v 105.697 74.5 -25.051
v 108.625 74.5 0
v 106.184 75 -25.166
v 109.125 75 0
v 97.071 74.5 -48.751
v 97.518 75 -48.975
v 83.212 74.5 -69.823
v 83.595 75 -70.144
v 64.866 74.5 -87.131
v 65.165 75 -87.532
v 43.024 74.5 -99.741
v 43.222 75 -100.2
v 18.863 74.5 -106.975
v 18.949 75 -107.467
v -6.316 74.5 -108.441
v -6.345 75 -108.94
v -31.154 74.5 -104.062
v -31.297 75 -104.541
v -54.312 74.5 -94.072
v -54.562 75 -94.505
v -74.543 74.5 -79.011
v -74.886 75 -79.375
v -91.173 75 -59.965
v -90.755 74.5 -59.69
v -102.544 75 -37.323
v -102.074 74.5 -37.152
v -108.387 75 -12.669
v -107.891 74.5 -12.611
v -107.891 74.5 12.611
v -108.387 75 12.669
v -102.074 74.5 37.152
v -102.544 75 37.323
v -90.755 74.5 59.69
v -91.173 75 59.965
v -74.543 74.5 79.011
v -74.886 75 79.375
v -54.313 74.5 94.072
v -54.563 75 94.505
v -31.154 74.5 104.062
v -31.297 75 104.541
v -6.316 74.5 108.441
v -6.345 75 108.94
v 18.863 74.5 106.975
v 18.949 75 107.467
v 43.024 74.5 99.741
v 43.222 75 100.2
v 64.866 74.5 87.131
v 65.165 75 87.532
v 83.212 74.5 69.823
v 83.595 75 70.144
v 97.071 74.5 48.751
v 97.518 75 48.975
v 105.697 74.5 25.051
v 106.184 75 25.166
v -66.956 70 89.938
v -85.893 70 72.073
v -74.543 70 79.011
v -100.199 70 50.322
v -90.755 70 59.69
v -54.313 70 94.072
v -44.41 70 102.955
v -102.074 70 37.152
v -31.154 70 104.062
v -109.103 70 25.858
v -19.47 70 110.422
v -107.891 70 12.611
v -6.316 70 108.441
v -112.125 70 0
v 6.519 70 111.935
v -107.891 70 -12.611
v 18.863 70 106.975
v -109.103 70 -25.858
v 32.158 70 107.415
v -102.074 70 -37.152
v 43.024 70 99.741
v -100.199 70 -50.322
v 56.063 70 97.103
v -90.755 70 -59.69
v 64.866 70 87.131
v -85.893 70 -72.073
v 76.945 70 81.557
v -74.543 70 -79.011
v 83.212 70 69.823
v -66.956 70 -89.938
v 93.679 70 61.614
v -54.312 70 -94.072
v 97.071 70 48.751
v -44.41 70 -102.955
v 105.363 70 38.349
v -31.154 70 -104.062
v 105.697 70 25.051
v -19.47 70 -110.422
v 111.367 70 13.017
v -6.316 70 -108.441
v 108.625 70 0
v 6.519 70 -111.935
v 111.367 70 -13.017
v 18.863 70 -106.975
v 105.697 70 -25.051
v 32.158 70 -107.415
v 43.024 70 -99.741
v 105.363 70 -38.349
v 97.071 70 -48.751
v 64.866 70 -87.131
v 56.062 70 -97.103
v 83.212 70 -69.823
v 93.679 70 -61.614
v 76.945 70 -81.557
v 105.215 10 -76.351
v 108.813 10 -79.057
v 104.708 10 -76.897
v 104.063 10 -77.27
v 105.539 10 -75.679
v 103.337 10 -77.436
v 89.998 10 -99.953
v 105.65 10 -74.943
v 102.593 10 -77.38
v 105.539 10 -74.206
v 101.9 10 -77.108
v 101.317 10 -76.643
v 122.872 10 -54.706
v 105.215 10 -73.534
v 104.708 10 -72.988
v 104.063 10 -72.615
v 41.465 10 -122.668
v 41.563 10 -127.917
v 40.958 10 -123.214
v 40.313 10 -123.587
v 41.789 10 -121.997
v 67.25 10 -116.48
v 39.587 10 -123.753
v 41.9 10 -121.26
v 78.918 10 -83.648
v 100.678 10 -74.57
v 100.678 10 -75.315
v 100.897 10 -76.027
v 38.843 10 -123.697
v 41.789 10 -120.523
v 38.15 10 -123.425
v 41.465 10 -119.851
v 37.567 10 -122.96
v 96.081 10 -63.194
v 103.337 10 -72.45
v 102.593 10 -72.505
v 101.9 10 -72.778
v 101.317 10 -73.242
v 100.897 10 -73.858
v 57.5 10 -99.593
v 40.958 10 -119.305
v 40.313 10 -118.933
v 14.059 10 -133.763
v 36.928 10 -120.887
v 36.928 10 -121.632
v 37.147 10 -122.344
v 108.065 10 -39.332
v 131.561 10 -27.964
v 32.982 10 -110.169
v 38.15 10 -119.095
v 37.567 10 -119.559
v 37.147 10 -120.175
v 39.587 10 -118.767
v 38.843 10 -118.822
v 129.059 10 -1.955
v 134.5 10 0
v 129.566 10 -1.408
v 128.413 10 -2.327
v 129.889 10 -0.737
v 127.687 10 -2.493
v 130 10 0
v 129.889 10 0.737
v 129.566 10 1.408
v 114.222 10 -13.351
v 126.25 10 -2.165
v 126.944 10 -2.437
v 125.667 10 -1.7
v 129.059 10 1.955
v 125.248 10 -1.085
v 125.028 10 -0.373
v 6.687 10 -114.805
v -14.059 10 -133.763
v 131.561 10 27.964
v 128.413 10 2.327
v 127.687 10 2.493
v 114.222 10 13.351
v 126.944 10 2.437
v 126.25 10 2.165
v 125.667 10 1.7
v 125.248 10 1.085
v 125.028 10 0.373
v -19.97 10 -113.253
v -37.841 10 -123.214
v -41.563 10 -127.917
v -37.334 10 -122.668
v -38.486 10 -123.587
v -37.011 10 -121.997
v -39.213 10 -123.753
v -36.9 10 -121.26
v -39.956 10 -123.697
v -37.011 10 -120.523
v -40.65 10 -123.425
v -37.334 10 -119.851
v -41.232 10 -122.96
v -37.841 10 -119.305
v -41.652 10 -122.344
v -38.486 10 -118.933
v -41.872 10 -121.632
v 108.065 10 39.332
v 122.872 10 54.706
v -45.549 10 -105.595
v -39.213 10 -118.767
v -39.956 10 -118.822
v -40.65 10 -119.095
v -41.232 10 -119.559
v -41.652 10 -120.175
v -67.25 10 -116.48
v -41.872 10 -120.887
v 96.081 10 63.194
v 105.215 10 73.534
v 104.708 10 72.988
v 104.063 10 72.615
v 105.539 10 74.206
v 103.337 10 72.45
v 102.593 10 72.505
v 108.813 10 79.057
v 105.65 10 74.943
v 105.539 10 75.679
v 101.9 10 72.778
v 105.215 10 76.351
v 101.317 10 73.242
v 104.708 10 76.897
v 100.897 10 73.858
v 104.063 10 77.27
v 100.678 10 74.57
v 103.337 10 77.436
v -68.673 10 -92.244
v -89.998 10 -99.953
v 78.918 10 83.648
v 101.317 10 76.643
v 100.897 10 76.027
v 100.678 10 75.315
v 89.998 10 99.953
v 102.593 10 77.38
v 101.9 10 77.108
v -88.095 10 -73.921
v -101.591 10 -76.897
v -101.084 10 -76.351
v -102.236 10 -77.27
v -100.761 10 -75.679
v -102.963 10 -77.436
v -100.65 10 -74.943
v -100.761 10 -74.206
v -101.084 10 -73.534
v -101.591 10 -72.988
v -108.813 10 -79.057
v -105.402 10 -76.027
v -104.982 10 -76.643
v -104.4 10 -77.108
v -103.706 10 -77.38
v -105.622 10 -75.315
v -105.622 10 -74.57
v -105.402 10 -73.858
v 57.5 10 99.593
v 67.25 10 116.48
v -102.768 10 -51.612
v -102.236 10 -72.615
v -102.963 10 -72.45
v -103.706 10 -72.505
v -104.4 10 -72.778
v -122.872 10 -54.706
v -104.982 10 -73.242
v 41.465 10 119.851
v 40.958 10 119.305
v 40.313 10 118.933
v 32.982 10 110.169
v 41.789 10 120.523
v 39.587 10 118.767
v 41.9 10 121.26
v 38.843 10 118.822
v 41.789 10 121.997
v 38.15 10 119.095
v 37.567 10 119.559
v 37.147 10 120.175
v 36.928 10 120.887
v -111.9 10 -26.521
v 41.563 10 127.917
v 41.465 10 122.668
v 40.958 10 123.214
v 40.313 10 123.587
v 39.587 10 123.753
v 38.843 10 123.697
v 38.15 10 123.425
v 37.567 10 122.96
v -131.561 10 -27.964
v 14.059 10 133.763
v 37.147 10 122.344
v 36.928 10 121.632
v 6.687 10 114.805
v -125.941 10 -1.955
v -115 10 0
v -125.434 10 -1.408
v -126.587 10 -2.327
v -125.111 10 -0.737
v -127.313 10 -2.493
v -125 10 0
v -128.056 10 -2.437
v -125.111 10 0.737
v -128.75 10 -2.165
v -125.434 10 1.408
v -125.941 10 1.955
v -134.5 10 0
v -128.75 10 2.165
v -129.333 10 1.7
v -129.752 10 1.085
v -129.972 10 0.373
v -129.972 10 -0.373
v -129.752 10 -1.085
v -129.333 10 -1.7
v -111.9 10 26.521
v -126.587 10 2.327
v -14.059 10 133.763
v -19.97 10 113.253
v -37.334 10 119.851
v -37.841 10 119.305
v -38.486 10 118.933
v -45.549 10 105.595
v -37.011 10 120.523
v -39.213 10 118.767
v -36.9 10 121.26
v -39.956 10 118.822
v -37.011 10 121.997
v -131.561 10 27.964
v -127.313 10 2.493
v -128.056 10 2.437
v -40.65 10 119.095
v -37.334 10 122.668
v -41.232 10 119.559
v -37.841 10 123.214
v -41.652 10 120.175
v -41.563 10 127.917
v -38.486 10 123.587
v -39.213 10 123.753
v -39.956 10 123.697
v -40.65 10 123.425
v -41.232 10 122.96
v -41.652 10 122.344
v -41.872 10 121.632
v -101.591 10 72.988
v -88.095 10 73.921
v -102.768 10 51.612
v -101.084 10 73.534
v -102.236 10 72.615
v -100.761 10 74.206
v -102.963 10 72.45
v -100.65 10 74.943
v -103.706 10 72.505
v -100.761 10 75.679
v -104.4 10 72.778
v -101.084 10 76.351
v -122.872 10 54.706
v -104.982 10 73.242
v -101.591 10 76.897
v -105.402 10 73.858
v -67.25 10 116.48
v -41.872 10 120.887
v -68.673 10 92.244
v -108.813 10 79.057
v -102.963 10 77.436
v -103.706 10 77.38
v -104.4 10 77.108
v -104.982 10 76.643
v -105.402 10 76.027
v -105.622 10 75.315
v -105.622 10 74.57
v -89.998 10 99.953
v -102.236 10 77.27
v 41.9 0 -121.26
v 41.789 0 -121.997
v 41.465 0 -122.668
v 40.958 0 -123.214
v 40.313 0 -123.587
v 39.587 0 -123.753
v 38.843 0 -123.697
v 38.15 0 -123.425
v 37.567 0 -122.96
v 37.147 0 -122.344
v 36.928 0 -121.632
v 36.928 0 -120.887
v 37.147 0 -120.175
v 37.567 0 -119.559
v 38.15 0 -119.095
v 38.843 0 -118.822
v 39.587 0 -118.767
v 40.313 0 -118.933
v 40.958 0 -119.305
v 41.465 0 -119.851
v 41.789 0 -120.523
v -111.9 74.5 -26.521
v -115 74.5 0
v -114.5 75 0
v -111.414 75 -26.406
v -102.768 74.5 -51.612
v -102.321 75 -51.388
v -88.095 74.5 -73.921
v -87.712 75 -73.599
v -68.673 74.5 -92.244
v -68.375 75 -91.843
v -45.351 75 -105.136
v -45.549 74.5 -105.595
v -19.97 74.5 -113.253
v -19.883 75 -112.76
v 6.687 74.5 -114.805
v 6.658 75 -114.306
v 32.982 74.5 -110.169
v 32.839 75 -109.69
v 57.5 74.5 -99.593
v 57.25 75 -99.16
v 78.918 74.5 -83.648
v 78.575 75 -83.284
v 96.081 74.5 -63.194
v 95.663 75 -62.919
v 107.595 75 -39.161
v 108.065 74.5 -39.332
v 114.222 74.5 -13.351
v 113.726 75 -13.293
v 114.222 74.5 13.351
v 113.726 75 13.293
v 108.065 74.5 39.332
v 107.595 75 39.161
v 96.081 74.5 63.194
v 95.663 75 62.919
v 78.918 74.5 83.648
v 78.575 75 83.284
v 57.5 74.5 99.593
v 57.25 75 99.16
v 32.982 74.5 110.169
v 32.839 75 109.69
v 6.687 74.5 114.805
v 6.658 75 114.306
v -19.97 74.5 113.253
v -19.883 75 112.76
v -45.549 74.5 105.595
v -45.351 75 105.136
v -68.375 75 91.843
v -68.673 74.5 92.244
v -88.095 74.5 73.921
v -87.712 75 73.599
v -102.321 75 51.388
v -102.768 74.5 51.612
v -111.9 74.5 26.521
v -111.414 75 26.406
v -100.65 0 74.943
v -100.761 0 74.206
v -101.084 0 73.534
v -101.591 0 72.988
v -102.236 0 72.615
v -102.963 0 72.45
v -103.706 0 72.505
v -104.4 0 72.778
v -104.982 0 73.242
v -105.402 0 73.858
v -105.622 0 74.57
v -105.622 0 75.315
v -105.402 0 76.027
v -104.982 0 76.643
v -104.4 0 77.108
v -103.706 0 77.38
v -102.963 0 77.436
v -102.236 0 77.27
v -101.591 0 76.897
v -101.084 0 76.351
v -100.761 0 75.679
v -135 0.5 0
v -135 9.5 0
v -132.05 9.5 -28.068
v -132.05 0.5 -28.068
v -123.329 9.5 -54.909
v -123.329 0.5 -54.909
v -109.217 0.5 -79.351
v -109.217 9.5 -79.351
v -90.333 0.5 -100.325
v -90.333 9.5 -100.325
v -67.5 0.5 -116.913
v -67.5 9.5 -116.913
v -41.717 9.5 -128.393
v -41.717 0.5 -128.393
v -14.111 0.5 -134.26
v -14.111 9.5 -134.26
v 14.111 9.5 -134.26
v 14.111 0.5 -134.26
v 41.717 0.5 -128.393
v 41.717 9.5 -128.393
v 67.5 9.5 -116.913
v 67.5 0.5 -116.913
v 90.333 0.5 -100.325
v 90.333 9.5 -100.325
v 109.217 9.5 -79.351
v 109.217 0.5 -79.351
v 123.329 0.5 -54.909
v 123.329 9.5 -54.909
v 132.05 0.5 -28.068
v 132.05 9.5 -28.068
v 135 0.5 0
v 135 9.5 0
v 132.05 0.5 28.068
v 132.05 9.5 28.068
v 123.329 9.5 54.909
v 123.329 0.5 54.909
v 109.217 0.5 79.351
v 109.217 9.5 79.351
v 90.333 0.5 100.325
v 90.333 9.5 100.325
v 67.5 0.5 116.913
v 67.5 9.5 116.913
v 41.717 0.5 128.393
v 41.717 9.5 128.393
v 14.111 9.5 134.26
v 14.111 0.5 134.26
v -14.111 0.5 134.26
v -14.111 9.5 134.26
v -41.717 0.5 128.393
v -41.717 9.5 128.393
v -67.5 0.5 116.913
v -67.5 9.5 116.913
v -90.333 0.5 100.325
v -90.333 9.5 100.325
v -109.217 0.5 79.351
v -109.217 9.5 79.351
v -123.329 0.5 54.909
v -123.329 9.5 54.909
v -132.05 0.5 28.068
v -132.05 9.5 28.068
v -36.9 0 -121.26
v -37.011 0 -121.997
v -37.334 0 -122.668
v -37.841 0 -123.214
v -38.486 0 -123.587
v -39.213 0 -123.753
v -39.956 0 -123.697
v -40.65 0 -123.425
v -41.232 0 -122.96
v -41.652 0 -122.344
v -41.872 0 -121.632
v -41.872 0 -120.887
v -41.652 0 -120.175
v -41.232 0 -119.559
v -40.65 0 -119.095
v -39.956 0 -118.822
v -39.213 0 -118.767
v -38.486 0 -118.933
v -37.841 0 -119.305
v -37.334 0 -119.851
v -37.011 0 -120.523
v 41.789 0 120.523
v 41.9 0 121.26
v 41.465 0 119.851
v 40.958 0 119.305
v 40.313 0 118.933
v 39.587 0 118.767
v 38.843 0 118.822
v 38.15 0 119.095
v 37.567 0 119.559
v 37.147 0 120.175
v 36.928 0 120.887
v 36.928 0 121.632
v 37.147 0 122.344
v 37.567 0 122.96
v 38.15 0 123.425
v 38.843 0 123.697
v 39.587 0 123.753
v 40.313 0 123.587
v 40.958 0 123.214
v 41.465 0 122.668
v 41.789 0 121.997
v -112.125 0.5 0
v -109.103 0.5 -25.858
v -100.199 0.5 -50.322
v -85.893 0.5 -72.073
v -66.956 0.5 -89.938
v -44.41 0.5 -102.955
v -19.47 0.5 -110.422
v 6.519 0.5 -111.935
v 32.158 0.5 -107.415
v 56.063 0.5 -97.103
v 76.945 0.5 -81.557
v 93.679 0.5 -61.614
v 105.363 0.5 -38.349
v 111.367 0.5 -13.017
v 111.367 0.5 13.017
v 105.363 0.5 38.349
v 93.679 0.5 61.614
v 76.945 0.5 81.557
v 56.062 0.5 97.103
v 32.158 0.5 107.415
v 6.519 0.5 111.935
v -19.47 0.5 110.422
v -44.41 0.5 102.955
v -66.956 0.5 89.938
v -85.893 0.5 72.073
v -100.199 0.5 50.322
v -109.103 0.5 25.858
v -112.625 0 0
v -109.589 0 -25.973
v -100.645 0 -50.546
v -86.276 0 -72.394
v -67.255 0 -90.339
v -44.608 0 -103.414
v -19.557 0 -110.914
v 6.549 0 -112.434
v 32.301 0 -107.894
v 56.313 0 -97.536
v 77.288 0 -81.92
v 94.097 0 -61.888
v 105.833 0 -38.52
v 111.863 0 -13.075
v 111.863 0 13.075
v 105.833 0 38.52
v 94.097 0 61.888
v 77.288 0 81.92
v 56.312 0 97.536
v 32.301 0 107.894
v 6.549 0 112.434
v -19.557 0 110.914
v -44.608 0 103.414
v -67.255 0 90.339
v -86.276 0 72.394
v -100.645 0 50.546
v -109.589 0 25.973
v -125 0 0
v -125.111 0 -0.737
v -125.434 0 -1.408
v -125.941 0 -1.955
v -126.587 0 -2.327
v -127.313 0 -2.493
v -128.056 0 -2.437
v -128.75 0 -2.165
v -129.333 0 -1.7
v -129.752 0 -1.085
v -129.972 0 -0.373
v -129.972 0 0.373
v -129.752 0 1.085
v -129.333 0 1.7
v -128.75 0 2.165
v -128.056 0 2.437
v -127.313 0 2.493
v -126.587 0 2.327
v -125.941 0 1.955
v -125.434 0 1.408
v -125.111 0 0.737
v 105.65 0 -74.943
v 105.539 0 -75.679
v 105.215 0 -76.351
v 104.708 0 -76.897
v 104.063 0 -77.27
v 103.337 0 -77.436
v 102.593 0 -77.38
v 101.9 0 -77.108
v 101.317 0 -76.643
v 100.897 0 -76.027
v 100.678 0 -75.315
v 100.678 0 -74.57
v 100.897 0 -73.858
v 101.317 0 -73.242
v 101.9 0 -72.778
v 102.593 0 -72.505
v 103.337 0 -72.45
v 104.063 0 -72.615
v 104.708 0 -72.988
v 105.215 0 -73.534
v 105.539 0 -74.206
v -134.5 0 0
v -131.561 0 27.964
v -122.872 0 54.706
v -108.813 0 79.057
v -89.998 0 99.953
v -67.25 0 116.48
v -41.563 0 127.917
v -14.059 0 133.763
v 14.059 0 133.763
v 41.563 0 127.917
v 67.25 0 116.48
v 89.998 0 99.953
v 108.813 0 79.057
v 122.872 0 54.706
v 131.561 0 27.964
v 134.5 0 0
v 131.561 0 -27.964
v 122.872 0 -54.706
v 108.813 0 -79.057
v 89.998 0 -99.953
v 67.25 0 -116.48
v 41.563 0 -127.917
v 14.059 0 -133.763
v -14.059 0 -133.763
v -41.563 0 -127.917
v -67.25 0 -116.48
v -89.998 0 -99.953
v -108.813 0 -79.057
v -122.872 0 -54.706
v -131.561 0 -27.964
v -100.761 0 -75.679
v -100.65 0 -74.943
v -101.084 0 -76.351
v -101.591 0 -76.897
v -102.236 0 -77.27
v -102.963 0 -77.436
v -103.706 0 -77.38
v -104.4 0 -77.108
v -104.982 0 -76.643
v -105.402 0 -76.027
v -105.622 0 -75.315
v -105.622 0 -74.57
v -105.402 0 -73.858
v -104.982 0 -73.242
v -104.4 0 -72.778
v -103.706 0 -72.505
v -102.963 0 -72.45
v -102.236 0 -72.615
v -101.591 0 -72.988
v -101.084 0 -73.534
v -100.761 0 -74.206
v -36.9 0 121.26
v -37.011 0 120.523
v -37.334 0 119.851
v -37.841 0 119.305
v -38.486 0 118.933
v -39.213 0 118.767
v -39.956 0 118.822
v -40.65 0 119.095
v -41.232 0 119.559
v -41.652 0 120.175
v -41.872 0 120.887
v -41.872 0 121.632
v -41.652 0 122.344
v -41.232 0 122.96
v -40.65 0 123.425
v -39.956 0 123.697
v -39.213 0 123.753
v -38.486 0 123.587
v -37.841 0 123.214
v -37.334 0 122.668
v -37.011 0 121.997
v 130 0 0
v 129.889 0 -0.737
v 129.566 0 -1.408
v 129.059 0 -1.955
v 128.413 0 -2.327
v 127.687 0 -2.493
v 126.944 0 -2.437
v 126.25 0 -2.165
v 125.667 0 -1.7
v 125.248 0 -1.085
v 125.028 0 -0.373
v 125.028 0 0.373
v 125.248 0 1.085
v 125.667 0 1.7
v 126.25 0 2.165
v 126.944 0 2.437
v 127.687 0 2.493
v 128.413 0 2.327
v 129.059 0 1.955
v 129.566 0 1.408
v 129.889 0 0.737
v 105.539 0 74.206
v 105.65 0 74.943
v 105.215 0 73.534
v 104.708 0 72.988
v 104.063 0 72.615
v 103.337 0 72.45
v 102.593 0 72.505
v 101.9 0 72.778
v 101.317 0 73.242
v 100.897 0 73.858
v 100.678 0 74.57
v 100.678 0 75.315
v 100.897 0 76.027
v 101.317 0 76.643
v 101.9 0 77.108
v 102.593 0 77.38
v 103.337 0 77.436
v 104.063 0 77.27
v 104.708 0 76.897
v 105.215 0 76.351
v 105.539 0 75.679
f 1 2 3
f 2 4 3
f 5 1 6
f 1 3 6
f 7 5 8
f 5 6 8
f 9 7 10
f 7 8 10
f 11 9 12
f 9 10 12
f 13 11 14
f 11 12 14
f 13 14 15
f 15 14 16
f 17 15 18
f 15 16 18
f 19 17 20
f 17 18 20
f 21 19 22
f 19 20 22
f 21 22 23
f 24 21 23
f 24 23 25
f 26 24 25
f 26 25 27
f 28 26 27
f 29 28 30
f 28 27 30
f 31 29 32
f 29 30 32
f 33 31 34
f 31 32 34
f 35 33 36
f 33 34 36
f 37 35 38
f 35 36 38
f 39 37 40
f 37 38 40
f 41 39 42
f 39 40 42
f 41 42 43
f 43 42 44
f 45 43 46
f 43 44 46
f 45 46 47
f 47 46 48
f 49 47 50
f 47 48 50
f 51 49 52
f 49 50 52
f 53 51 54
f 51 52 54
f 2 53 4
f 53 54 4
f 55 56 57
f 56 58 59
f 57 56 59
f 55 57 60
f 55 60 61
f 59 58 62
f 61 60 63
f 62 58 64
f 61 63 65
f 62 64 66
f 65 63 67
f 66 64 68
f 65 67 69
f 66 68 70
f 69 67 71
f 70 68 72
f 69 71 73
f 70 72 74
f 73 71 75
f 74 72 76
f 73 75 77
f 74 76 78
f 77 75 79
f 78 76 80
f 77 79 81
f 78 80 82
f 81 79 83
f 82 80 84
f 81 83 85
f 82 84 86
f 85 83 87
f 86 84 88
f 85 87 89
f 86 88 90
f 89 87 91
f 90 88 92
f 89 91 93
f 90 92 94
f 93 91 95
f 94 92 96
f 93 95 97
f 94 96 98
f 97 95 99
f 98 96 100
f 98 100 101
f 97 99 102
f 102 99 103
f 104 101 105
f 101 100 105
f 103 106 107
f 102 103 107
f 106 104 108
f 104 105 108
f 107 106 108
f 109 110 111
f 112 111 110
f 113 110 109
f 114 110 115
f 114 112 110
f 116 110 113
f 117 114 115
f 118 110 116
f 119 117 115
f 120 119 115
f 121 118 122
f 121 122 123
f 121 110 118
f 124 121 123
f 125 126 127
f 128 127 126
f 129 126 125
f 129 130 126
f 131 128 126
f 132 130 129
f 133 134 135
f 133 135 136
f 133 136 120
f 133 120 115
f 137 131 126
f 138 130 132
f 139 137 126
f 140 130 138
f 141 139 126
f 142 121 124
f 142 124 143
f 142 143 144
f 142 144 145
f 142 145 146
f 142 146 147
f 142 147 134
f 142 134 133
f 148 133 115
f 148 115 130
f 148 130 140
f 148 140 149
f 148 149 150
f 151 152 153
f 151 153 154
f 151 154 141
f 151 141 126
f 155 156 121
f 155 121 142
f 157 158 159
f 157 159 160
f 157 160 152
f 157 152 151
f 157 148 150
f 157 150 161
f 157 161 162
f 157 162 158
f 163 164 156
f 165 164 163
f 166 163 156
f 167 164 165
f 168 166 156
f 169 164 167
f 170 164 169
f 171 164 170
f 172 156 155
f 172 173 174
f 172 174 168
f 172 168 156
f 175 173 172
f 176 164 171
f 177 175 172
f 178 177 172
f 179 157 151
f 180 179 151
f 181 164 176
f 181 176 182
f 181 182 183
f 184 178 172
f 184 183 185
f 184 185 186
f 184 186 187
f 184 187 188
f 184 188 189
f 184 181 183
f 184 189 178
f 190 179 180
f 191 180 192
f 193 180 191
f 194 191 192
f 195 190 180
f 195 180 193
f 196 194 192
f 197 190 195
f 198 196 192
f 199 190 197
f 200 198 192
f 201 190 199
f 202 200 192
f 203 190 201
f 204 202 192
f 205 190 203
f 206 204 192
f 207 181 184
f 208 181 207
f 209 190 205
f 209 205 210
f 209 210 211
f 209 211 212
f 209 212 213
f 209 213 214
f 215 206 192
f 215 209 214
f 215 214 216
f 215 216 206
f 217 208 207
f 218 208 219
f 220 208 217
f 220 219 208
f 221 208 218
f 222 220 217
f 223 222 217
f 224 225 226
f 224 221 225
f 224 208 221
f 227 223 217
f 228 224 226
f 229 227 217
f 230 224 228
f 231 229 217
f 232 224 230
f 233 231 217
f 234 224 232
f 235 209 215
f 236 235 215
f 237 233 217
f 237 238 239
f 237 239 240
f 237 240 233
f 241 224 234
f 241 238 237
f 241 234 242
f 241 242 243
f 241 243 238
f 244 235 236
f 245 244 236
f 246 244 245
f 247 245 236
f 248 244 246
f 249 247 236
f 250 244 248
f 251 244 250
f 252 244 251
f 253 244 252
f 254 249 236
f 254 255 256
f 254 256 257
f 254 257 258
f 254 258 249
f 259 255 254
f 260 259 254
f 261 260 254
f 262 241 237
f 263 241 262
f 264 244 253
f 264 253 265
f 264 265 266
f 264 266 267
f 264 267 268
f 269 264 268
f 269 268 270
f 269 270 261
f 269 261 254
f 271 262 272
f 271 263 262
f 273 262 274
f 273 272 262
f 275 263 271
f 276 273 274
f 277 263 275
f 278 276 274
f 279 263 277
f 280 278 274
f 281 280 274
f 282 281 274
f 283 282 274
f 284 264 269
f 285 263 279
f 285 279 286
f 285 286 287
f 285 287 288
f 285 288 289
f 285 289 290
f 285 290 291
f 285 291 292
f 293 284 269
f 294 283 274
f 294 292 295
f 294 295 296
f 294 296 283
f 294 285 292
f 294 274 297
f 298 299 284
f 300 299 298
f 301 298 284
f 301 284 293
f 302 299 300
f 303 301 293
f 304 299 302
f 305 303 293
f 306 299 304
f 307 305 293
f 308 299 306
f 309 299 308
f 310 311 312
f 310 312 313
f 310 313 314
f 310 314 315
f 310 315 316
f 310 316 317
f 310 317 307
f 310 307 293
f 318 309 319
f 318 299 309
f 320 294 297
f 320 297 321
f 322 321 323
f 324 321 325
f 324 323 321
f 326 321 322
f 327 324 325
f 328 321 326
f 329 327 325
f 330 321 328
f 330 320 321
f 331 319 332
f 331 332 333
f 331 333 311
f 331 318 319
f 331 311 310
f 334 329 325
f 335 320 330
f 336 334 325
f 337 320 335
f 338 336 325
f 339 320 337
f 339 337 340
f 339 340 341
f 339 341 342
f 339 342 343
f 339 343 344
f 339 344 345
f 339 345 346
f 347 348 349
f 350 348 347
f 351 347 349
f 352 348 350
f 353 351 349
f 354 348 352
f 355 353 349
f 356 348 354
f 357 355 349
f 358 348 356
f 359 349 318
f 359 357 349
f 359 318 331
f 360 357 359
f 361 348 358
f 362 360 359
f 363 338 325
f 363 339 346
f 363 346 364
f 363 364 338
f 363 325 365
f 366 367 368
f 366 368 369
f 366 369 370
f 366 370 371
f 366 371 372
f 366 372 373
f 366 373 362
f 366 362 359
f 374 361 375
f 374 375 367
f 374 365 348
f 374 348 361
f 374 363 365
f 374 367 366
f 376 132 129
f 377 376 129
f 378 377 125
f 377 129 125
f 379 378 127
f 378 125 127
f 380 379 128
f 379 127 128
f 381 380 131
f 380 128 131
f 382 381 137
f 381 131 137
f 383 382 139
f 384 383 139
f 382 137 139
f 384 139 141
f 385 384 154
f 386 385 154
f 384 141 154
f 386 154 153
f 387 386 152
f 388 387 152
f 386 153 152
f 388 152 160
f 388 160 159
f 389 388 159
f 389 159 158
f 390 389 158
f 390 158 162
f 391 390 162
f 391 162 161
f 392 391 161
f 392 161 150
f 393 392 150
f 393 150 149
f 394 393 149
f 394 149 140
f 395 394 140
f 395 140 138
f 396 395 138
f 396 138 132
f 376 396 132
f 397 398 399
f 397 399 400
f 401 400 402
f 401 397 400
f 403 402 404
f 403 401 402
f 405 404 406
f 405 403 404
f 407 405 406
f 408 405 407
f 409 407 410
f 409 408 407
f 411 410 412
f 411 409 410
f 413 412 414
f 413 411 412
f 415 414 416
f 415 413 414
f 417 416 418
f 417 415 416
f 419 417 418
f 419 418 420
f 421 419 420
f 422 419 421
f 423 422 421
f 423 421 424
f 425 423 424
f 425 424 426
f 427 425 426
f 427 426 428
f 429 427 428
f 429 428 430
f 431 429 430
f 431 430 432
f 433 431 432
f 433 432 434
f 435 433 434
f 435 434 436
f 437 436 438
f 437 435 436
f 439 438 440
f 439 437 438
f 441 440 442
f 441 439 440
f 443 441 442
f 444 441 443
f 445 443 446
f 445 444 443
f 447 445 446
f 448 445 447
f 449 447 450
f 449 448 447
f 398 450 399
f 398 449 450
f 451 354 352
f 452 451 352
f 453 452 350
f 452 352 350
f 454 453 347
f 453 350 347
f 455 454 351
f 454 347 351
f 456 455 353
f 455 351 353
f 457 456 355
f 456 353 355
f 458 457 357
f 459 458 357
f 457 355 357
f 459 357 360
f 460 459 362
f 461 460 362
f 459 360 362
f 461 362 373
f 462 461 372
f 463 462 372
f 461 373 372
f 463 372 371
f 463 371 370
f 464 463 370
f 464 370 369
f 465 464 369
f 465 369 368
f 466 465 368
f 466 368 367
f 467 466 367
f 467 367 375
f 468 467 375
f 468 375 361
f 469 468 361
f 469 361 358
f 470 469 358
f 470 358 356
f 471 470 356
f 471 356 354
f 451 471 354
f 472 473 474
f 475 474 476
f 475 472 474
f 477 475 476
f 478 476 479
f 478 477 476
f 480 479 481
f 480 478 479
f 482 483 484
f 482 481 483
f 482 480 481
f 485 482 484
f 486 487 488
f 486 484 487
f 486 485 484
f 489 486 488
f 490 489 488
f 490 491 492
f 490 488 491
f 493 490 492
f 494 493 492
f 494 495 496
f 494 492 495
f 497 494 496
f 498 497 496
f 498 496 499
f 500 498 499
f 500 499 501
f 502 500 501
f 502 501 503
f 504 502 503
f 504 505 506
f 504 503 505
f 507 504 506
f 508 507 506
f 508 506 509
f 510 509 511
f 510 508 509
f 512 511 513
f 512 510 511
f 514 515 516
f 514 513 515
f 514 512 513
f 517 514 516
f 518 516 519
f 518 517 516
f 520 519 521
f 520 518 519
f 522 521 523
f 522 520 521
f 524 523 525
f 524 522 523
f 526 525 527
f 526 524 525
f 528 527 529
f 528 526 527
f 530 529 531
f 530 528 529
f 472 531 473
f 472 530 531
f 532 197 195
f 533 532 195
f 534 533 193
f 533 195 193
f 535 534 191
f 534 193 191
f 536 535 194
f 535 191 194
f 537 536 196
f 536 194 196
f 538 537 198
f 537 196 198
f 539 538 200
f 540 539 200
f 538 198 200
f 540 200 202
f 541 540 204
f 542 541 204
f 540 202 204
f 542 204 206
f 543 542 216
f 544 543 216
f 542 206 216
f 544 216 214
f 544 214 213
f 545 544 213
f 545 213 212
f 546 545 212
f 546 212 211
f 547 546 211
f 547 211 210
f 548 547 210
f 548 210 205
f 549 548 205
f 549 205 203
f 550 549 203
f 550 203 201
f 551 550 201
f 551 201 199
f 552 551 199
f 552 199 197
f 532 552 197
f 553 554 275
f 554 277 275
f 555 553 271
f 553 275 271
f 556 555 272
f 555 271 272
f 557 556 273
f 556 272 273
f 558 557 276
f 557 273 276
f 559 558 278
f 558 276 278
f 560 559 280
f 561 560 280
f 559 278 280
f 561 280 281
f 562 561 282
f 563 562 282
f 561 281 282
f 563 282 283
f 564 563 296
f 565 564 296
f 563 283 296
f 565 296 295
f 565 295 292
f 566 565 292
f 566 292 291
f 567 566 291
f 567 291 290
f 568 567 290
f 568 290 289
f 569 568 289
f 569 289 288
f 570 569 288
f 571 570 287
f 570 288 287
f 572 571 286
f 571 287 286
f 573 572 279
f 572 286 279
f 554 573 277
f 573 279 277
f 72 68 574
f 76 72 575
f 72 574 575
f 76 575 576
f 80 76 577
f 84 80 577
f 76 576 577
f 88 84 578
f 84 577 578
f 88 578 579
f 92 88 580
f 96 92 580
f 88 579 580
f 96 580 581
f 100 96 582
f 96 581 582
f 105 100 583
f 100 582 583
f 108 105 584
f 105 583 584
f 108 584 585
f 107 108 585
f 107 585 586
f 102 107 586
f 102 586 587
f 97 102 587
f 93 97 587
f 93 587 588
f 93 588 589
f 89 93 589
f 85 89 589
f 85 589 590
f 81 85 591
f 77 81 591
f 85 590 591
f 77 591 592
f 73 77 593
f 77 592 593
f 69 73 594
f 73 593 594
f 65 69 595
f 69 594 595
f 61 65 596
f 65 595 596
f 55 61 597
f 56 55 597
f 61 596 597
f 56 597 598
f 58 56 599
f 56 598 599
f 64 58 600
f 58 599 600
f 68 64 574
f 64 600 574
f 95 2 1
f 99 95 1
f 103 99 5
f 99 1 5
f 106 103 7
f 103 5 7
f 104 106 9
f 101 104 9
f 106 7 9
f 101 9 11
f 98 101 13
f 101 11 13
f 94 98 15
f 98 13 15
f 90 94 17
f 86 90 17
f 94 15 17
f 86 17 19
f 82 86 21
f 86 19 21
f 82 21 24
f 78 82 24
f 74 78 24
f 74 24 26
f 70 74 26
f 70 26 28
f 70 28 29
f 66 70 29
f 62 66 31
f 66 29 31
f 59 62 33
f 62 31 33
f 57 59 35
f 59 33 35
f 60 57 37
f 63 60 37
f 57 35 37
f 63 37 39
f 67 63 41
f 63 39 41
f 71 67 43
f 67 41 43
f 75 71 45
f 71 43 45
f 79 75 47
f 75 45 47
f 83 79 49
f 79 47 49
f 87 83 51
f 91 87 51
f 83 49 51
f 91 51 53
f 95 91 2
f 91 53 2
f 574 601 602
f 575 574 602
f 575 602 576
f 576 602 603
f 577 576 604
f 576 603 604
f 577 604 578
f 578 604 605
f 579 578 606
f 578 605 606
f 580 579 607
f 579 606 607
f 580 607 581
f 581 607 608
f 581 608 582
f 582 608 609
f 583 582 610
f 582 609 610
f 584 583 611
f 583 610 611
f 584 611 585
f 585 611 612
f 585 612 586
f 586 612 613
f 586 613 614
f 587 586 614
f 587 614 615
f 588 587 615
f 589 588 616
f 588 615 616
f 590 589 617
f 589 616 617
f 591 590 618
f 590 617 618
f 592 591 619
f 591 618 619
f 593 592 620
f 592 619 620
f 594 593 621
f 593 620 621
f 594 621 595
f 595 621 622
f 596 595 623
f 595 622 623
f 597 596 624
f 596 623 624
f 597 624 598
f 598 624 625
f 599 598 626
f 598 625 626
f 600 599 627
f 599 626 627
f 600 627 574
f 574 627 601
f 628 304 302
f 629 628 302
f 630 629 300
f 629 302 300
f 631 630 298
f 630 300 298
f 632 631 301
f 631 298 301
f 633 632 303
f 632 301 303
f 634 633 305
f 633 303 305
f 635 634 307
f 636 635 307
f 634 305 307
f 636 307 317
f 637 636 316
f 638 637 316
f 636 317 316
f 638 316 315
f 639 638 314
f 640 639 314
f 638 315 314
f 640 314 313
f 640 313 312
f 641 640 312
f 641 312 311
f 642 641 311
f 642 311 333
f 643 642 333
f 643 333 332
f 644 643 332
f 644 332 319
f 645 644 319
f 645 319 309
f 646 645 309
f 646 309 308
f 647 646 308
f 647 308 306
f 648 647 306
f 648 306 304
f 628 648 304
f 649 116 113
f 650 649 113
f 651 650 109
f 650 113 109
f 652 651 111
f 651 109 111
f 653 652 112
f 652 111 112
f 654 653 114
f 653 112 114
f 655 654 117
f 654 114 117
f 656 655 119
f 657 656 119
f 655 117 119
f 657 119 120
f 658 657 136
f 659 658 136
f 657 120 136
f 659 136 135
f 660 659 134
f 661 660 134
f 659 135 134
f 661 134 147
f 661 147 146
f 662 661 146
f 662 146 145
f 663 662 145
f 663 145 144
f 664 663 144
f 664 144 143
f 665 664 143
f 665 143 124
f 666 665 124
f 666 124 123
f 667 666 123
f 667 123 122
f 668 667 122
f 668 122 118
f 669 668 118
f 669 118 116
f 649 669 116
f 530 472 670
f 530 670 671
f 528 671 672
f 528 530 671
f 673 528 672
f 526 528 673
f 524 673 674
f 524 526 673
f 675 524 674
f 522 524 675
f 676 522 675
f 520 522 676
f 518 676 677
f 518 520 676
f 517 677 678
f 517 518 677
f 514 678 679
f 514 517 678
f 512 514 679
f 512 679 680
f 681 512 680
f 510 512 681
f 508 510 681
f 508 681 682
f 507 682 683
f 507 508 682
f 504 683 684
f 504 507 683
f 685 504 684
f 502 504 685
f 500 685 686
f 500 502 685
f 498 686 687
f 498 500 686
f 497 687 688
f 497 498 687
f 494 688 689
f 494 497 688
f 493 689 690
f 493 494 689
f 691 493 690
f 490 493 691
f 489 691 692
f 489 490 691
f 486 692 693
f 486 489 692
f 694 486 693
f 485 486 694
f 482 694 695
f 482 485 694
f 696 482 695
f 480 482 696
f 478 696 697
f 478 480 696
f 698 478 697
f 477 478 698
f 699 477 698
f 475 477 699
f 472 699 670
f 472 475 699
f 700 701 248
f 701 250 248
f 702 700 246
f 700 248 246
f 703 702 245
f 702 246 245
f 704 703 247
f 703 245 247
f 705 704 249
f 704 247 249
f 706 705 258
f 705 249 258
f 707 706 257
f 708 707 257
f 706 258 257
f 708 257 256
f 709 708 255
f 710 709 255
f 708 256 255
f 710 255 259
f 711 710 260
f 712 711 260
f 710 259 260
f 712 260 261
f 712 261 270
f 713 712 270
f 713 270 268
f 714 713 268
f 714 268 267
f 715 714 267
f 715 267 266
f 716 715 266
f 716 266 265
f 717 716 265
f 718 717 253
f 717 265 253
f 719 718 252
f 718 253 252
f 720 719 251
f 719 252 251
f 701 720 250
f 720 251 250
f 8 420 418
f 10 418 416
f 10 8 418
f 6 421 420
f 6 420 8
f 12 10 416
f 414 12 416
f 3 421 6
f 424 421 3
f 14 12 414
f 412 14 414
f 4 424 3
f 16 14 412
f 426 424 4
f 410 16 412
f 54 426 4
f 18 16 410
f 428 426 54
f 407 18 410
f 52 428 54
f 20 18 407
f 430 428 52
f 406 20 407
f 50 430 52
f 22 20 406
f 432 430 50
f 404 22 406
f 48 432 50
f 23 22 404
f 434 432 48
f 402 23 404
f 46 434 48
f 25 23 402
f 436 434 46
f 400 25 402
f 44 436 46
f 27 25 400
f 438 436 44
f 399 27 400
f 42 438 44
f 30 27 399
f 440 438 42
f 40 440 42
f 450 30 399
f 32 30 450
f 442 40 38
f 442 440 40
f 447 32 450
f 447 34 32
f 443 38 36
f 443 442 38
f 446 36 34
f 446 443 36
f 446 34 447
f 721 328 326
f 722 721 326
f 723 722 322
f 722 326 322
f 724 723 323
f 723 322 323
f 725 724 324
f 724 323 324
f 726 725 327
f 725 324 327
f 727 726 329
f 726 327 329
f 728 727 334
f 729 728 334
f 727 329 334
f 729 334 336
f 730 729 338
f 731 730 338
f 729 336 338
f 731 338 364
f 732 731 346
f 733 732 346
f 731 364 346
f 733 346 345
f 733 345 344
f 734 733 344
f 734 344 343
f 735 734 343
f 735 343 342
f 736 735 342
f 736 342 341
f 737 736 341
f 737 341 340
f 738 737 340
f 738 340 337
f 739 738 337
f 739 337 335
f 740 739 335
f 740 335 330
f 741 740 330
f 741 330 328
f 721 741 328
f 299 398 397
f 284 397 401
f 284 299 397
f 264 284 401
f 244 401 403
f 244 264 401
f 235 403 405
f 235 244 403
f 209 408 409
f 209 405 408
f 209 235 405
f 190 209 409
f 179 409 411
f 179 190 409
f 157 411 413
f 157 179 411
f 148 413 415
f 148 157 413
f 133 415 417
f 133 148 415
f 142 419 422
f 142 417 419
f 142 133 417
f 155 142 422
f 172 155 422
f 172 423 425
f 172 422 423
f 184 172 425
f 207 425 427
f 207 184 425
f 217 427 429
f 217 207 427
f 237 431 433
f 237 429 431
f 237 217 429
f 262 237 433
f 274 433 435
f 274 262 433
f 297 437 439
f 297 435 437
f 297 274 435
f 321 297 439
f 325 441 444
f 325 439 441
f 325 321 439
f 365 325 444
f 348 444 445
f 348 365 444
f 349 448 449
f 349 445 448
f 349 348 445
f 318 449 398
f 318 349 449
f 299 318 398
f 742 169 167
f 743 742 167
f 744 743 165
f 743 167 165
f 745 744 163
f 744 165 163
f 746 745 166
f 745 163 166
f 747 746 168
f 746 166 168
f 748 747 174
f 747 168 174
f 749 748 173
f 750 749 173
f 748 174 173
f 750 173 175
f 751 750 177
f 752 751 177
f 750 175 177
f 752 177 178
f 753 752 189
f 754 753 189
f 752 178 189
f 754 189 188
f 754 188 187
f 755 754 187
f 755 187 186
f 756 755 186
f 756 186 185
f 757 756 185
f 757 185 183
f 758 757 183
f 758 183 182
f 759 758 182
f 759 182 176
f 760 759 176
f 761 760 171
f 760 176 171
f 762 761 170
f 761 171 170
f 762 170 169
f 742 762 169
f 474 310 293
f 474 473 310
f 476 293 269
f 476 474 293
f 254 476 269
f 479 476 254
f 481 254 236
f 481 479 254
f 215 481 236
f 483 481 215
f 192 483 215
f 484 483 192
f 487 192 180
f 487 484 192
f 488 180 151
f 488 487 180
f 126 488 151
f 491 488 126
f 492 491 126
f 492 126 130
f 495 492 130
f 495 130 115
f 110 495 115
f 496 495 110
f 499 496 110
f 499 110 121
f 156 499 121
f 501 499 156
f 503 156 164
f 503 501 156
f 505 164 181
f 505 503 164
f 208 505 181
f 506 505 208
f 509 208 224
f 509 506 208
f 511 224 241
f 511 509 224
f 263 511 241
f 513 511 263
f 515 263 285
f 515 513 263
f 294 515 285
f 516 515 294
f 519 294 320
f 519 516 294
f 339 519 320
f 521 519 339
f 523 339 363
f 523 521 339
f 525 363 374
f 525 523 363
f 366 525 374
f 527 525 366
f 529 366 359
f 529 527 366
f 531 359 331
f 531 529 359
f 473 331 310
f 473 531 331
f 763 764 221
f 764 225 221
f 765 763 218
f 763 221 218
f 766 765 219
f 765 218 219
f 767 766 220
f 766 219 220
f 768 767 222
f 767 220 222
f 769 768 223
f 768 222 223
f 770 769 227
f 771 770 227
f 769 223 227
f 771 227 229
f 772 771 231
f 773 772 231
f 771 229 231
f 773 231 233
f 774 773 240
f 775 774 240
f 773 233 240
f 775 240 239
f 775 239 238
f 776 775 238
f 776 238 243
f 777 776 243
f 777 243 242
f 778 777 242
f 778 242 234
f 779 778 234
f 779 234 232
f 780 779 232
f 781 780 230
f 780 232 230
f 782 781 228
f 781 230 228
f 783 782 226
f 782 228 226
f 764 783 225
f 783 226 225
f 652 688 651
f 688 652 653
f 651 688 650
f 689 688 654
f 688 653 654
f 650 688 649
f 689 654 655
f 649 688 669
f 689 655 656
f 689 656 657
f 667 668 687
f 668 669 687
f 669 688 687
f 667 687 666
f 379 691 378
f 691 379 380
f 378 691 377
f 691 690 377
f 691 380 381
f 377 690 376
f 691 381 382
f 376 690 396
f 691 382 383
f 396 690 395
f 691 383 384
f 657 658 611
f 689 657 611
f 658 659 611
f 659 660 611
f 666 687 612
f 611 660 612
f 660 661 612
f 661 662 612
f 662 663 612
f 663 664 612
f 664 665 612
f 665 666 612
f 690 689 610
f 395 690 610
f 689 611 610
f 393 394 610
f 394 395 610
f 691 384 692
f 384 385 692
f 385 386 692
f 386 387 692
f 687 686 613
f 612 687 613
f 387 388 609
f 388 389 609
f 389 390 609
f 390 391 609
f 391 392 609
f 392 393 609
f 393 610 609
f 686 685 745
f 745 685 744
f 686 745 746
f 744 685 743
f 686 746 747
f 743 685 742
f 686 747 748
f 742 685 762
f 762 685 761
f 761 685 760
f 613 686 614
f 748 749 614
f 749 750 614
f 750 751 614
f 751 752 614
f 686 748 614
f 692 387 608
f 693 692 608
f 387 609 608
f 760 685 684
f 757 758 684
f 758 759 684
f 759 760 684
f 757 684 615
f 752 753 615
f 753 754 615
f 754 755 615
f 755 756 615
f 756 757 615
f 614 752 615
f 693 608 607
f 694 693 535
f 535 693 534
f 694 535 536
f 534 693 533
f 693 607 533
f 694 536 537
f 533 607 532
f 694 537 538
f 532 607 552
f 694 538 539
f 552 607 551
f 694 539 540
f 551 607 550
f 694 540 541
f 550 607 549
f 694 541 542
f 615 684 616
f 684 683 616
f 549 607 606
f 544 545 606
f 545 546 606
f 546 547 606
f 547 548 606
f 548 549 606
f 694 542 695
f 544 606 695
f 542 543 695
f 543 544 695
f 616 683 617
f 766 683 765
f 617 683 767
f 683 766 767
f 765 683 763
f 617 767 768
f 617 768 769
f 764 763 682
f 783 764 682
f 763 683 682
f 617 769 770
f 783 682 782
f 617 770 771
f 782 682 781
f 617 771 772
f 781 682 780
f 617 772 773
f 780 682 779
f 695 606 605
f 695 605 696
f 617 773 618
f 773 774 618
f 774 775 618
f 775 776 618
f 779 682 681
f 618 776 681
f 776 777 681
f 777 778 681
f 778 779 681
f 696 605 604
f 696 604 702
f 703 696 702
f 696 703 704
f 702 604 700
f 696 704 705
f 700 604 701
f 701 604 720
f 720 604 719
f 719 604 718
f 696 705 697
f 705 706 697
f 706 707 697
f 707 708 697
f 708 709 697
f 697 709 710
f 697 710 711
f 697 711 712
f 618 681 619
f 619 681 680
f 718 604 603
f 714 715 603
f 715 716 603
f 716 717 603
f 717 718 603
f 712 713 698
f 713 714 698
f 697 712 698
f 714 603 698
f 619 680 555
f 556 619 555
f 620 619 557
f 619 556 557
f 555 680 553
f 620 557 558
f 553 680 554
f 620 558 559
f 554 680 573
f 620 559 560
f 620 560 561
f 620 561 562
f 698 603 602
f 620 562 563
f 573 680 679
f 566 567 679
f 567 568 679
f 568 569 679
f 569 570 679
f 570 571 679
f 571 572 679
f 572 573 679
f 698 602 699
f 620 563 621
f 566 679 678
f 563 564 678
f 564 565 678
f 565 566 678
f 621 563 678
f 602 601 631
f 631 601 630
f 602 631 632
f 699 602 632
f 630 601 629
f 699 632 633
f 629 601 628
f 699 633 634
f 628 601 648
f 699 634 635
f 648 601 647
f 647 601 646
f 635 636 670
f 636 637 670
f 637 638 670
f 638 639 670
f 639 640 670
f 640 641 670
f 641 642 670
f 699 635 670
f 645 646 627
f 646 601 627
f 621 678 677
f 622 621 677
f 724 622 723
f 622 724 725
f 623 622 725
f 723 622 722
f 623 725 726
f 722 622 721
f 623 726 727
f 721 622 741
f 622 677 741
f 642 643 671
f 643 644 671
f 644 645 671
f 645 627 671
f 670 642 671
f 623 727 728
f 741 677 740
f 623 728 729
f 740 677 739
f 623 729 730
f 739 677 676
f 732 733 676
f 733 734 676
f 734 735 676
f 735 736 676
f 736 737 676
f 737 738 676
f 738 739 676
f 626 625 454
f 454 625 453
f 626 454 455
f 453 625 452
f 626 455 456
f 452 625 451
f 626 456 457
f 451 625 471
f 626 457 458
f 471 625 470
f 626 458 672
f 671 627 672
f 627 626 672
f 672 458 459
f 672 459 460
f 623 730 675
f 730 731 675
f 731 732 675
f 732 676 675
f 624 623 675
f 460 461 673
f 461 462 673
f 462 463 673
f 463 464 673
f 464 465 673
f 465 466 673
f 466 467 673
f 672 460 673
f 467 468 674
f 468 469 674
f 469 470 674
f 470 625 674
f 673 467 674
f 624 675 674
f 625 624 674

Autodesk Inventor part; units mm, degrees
ref_plane "YZ Plane" through (0, 0, 0) normal (1, 0, 0) x (0, 1, 0)
ref_plane "XZ Plane" through (0, 0, 0) normal (0, 1, 0) x (-1, 0, 0)
ref_plane "XY Plane" through (0, 0, 0) normal (0, 0, 1) x (1, 0, 0)
sketch "Sketch1" plane through (0, 0, 0) normal (0, 1, 0) x (-1, 0, 0)
  circle A0 centre (0, 0) radius 135
  circle A1 centre (0, 0) radius 115
  circle A2 centre (0, 0) radius 112.125
  circle A3 centre (0, 0) radius 9.5
  dimension "Absolute_Diameter" = 270
  dimension "Diameter_No_Outer_Lip" = 230
  dimension "Inner_Cylinder_Diameter" = 224.25
  dimension "Lip_Diameter" = 19
extrude "Extrusion1" add sketch "Sketch1" along normal blind 10 contours A0
extrude "Extrusion2" add sketch "Sketch1" along normal blind 75 contours A1
sketch "Sketch2" plane through (0, 75, 0) normal (0, 1, 0) x (1, 0, 0)
  circle A0 centre (0, 0) radius 115
  circle A1 centre (0, 0) radius 108.625
  dimension "Lip_Diameter_Out" = 230
  dimension "Inner_Lip_Diameter" = 217.25
extrude "Extrusion7" add sketch "Sketch2" against normal blind 5
chamfer "Chamfer1" distance 0.5 angle 45 2 edges at (115, 75, 0) (-108.625, 75, 0)
chamfer "Chamfer2" distance 0.5 angle 45 3 edges at (135, 10, 0) (135, 0, 0) (112.125, 0, 0)
sketch "Sketch3" plane through (0, 10, 0) normal (0, 1, 0) x (1, 0, 0)
  circle A0 centre (0, 0) radius 127.5
  circle A1 centre (-127.5, 0) radius 2.5
  circle A2 centre (-103.1497, -74.9426) radius 2.5
  circle A3 centre (-39.3997, -121.2597) radius 2.5
  circle A4 centre (39.3997, -121.2597) radius 2.5
  circle A5 centre (103.1497, -74.9426) radius 2.5
  circle A6 centre (127.5, 0) radius 2.5
  circle A7 centre (103.1497, 74.9426) radius 2.5
  circle A8 centre (39.3997, 121.2597) radius 2.5
  circle A9 centre (-39.3997, 121.2597) radius 2.5
  circle A10 centre (-103.1497, 74.9426) radius 2.5
  dimension "d27" = 255
  dimension "d28" = 5
  dimension "d31" = 360
extrude "Extrusion8" cut sketch "Sketch3" against normal blind 10 contours A0 A6 | A0 A6 | A7 A0 | A0 A7 | A5 A0 | A0 A5 | A8 A0 | A0 A8 | A4 A0 | A0 A4 | A9 A0 | A0 A9 | A3 A0 | A0 A3 | A10 A0 | A0 A10 | A2 A0 | A0 A2 | A1 A0 | A0 A1
sketch "Sketch4" plane through (0, 75, 0) normal (0, 1, 0) x (1, 0, 0)
  circle A0 centre (0, 0) radius 42.5
  circle A1 centre (0, 0) radius 37.5
  circle A2 centre (0, 0) radius 40
  circle A3 centre (-40, 0) radius 1
  circle A4 centre (-24.9396, -31.2733) radius 1
  circle A5 centre (8.9008, -38.9971) radius 1
  circle A6 centre (36.0388, -17.3553) radius 1
  circle A7 centre (36.0388, 17.3553) radius 1
  circle A8 centre (8.9008, 38.9971) radius 1
  circle A9 centre (-24.9396, 31.2733) radius 1
  dimension "d35" = 80
  dimension "d36" = 2
  dimension "d39" = 360
hole "Hole1" [suppressed]
properties part number "Cylinder  Segment - 01"
